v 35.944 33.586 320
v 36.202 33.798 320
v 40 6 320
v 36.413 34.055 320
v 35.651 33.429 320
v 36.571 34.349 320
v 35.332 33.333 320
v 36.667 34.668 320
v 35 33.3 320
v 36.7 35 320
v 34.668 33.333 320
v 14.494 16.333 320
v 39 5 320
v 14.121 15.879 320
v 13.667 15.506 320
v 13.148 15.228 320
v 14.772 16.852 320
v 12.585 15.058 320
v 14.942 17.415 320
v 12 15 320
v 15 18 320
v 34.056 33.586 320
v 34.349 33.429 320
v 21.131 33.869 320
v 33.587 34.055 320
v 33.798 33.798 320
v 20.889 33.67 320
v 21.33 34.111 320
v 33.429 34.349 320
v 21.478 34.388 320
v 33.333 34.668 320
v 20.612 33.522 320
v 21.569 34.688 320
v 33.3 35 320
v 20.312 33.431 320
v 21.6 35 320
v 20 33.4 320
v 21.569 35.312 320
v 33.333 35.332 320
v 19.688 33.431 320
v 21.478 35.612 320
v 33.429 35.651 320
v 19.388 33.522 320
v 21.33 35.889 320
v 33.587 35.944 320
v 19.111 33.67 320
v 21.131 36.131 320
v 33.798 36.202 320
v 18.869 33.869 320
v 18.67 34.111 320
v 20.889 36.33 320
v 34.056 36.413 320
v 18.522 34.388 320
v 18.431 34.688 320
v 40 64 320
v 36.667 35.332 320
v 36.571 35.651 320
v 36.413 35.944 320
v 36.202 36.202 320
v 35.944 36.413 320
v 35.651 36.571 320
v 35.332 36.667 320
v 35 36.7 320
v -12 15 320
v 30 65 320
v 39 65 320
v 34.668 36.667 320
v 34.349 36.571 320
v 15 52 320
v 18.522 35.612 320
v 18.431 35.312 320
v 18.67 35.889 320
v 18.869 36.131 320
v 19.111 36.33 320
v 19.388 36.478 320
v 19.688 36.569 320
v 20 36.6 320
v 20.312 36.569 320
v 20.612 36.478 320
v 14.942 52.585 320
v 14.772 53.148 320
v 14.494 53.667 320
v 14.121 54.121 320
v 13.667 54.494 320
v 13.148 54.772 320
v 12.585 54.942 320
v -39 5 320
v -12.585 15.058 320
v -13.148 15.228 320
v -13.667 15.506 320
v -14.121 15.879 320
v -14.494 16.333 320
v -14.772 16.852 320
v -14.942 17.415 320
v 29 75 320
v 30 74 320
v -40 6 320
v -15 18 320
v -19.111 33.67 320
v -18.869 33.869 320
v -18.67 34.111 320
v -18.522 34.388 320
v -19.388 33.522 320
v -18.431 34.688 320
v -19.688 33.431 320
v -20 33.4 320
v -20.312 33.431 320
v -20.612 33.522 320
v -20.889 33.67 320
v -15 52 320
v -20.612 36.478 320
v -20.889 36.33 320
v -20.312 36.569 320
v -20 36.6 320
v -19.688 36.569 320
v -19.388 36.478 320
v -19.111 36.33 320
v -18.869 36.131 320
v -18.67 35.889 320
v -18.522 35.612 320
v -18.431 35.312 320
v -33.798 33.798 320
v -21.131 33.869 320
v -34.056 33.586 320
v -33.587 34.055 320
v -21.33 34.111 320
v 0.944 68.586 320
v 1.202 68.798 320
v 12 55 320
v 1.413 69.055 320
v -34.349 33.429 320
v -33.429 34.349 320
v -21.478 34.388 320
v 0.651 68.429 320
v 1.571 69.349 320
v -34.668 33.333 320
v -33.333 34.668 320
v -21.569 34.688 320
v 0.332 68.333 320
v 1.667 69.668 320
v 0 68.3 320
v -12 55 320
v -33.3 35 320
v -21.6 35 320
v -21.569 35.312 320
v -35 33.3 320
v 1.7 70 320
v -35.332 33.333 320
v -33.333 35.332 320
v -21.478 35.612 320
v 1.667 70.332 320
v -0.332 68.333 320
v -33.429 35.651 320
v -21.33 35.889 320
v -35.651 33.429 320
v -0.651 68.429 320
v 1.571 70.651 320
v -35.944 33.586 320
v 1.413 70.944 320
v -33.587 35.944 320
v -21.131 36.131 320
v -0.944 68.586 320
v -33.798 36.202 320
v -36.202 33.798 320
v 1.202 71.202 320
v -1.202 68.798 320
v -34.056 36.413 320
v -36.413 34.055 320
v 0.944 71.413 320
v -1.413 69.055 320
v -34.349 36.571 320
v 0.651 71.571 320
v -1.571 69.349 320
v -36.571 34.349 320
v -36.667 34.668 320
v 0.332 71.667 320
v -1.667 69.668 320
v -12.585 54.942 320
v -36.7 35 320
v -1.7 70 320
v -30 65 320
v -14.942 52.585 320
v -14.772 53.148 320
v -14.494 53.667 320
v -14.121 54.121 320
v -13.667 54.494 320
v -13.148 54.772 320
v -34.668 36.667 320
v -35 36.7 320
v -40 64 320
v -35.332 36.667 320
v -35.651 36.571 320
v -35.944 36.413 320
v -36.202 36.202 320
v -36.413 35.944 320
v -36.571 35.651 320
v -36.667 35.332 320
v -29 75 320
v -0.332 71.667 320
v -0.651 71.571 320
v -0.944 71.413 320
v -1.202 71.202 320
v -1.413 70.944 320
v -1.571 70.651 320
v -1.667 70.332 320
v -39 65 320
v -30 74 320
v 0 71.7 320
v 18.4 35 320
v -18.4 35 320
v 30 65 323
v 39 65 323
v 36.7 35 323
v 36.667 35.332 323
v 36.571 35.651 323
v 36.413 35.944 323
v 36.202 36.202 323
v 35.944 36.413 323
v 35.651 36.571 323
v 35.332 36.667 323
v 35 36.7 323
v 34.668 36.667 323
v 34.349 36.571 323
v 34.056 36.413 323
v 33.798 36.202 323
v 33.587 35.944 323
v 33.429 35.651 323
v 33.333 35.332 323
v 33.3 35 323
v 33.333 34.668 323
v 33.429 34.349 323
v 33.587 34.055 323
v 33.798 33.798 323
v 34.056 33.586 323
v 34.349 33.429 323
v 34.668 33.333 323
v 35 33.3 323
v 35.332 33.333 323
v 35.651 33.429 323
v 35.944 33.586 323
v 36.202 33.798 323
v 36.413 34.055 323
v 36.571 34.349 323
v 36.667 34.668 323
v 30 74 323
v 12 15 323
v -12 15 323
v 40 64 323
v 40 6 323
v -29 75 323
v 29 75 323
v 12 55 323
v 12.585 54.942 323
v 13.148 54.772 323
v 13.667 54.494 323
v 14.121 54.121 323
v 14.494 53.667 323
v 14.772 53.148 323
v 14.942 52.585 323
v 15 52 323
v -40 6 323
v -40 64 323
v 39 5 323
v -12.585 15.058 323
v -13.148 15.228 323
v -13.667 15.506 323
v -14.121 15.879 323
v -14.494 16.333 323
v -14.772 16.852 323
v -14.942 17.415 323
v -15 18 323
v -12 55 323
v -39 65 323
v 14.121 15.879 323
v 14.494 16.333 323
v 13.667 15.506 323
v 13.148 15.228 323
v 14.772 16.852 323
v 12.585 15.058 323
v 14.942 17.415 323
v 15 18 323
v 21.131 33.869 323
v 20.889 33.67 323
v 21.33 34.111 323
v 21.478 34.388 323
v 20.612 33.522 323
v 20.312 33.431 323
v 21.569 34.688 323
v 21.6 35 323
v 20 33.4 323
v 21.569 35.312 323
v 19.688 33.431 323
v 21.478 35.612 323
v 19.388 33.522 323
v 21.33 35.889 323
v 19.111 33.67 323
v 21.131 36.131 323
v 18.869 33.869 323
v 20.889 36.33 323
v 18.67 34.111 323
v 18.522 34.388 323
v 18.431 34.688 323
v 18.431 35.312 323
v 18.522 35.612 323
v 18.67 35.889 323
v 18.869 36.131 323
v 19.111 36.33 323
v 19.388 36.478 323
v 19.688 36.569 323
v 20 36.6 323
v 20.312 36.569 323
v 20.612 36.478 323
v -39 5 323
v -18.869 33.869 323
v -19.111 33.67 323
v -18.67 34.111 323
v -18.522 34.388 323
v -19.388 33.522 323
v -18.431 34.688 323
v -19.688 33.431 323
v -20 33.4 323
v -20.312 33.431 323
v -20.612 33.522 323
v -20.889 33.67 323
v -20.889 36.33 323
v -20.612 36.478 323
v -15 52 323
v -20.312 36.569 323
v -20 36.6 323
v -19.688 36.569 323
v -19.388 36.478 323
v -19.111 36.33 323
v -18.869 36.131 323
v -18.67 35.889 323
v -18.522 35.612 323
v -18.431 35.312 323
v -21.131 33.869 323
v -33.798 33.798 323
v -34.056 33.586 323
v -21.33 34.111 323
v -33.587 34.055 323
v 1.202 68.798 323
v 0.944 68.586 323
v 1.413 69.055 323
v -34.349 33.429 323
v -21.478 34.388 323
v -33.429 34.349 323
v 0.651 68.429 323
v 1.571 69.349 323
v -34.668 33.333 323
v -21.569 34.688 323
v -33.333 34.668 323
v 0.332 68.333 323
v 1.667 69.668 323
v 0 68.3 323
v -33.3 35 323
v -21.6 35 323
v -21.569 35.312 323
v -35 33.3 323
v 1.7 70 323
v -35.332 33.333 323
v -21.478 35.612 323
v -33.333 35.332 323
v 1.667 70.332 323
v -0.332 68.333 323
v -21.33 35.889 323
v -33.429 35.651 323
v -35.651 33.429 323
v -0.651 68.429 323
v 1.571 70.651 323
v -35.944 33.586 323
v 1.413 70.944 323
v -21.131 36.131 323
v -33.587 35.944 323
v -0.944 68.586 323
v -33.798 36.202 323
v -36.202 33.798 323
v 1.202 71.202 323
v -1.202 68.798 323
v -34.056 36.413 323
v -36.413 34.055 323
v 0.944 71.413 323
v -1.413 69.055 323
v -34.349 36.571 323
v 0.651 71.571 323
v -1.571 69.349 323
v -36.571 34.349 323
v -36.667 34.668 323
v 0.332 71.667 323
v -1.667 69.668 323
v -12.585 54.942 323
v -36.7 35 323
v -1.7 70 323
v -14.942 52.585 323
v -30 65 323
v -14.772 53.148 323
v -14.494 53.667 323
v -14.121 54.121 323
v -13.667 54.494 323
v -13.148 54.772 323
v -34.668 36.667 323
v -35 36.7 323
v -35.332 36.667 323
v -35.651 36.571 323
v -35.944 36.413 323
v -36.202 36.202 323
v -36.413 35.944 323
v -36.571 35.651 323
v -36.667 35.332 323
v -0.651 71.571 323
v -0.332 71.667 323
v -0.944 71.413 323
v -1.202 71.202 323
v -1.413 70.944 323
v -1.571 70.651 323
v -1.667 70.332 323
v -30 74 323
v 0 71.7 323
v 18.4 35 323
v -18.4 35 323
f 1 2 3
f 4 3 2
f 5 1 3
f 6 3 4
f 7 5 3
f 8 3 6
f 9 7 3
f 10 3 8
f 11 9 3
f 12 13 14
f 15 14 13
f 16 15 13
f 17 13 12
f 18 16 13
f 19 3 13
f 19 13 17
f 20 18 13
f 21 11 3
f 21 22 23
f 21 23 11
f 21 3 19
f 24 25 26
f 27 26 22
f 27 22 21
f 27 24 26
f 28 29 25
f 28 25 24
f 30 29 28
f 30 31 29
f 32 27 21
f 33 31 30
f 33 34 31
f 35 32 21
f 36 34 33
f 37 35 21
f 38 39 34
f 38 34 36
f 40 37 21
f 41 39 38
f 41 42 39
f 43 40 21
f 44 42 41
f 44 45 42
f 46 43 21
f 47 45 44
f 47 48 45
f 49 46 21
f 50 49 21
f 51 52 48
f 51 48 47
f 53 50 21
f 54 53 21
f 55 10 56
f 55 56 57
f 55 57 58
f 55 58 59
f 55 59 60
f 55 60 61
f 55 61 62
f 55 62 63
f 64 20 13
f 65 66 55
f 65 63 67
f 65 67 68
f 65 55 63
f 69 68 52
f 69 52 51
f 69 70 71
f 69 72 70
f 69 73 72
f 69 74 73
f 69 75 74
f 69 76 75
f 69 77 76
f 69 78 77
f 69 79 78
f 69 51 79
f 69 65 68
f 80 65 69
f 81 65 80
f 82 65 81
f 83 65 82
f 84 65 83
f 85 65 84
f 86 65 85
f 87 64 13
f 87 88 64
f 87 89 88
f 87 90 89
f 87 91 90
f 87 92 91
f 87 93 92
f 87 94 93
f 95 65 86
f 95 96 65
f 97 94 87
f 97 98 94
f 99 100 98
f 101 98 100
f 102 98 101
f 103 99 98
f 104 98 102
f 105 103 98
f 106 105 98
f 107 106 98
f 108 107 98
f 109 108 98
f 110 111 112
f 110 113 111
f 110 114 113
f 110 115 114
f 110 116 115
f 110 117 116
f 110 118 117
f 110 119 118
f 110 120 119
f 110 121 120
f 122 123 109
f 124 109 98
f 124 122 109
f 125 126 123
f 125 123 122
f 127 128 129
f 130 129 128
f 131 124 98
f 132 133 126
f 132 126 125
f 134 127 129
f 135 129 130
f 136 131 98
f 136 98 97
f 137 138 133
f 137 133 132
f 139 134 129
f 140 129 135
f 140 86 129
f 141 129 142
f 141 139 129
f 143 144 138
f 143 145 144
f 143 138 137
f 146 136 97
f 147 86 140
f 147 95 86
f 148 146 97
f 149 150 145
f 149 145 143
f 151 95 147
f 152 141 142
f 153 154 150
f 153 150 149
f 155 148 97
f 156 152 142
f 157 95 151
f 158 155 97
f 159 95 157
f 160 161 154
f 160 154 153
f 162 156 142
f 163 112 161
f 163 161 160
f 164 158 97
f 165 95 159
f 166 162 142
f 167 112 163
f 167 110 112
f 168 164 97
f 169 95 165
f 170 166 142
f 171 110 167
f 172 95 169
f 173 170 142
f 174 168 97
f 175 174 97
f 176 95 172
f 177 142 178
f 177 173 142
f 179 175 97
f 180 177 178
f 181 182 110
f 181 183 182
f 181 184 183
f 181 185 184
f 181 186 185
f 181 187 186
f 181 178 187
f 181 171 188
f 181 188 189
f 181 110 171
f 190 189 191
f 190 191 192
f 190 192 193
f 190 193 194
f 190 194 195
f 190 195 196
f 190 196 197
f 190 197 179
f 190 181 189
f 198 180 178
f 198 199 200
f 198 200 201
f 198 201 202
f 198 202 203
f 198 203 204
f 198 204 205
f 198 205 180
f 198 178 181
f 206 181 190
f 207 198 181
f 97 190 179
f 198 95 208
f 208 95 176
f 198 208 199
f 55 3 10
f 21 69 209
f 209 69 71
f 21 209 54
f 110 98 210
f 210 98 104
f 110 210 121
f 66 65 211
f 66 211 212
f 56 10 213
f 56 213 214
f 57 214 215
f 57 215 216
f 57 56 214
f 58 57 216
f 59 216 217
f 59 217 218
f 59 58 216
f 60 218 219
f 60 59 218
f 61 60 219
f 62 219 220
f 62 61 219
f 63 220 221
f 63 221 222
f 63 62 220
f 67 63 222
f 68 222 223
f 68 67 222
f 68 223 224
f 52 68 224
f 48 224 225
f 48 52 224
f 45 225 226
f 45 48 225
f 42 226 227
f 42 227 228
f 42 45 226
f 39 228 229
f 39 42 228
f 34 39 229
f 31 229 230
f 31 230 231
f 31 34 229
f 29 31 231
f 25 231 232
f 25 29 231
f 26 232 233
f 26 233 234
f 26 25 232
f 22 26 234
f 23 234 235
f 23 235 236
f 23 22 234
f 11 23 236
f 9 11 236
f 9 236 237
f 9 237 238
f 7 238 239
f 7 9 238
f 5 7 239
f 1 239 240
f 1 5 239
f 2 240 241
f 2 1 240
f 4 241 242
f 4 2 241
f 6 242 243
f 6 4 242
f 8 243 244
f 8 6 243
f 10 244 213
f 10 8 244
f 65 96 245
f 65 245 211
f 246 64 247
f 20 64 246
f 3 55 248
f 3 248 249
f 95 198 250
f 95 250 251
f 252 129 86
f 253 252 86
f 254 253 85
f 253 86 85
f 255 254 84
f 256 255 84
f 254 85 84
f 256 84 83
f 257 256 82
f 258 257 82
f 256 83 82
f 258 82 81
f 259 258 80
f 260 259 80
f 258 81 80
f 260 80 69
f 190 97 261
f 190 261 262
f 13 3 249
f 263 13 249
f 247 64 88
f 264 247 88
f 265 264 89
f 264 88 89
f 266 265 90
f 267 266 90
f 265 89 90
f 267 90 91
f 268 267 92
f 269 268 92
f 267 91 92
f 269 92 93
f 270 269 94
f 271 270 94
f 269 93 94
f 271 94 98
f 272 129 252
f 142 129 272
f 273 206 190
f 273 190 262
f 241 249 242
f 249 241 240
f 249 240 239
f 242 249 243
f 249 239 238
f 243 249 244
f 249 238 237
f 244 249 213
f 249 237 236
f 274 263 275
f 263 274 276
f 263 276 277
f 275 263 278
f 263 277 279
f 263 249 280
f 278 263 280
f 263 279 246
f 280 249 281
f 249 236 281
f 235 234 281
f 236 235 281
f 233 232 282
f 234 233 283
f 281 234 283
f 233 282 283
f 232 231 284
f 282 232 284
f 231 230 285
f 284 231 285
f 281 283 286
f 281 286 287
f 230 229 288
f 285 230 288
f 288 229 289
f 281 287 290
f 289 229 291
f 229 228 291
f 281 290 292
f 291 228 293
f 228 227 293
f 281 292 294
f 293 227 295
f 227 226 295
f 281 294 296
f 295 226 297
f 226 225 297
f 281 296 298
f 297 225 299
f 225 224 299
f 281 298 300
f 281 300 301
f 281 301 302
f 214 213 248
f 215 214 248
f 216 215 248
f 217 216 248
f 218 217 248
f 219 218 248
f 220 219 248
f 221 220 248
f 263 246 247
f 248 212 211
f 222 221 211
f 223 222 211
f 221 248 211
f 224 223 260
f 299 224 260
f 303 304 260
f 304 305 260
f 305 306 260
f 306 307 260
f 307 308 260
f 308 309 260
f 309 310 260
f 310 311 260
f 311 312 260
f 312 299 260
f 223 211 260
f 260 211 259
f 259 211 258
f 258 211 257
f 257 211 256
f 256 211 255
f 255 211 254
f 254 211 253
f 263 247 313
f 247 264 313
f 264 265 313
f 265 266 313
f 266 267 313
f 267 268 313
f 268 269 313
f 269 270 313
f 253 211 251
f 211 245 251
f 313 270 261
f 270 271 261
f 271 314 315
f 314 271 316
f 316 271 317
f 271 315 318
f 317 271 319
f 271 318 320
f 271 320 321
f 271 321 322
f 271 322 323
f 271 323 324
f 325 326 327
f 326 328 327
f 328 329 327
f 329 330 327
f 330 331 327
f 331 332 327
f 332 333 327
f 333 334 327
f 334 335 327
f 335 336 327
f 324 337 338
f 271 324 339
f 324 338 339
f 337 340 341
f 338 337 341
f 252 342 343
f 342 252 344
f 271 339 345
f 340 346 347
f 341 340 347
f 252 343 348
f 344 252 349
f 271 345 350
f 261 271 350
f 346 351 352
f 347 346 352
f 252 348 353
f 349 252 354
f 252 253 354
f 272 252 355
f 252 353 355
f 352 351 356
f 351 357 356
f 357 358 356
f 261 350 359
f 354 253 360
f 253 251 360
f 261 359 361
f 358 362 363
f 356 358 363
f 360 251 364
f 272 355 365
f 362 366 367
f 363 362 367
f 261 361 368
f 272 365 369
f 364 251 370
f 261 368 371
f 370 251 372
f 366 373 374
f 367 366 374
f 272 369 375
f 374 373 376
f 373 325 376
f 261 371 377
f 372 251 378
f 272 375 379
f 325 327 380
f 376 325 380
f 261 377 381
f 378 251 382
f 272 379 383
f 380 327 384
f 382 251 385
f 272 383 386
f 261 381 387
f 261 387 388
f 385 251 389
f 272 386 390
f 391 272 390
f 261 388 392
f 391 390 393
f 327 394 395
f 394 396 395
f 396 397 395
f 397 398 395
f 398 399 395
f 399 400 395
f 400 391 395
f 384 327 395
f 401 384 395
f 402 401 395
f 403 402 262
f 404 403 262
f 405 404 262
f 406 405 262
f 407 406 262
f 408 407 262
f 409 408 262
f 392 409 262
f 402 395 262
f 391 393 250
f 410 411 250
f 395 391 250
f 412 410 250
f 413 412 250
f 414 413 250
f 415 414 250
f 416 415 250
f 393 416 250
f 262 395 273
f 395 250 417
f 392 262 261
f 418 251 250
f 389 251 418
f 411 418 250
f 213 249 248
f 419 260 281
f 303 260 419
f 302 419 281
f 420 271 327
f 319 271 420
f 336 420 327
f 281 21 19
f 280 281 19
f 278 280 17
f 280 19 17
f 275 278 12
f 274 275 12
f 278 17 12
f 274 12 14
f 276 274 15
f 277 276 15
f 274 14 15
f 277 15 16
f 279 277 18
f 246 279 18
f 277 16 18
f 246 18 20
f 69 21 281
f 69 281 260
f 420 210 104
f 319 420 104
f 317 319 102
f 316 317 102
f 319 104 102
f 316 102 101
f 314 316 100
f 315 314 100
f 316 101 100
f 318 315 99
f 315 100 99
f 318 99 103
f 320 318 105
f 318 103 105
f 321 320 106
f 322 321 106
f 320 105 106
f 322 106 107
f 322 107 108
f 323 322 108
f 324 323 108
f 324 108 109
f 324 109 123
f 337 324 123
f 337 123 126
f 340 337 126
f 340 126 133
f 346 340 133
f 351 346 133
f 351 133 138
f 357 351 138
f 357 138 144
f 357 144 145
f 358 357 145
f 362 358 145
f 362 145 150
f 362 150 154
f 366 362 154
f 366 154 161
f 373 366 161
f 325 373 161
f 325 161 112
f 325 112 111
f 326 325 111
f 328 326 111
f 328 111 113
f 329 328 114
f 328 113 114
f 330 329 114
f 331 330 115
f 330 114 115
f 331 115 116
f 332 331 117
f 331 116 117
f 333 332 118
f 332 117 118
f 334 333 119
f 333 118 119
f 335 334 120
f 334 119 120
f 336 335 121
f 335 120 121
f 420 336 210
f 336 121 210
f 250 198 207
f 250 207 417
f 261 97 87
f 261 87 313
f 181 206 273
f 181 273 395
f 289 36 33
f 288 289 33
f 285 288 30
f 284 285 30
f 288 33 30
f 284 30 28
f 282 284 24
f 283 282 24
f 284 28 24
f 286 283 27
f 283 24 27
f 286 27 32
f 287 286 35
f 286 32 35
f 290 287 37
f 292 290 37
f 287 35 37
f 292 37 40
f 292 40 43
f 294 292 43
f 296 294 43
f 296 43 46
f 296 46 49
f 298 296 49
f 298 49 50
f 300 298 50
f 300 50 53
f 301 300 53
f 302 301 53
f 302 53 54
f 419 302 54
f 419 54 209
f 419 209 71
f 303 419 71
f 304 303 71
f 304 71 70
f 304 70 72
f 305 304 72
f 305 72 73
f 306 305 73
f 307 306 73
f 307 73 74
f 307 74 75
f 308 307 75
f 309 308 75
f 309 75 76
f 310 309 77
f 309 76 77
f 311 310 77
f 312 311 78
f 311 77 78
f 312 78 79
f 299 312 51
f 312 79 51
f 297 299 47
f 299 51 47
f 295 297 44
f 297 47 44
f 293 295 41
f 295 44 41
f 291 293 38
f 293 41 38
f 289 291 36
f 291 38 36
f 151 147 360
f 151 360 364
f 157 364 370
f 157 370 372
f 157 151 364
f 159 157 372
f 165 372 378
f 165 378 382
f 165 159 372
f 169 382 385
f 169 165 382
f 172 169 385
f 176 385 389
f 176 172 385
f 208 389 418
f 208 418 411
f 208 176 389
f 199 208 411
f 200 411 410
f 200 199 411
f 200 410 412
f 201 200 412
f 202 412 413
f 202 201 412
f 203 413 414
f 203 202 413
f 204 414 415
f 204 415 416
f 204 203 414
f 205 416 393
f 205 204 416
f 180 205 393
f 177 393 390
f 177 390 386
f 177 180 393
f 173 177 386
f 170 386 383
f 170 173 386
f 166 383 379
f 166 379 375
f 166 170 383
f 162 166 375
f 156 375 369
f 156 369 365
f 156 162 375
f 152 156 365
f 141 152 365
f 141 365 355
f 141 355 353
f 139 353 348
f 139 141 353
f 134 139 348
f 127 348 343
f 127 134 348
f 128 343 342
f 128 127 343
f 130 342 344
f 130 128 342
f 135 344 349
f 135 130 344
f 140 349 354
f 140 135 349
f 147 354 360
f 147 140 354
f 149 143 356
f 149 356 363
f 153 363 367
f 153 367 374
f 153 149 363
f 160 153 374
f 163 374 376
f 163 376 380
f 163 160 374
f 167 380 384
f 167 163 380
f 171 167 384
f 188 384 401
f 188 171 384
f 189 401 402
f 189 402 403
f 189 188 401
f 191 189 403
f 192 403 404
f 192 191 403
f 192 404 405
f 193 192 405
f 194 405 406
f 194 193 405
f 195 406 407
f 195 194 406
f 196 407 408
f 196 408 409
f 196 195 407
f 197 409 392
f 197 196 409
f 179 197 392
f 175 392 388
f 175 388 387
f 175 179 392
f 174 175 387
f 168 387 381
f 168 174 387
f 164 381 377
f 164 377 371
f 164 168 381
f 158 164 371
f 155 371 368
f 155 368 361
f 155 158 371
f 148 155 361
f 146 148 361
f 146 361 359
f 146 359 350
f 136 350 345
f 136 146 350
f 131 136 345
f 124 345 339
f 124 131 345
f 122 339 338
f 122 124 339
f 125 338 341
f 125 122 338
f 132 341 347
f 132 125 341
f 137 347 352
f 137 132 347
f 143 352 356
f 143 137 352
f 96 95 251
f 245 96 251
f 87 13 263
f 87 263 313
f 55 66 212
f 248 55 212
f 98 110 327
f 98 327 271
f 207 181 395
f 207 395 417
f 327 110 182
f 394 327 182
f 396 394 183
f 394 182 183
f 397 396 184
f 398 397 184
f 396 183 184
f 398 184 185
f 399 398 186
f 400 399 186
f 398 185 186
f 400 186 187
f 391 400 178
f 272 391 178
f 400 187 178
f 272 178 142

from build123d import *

# Parameters (mm, degrees)
SKETCH152_R     = 1.7
PAD084_DEPTH    = 3
CHAMFER055_SIZE = 1
SKETCH225_R     = 1.6
POCKET053_DEPTH = 3.001


with BuildPart() as part:
    # Sketch152 → Pad084 (new body)
    with BuildSketch(Plane.XY):
        Polygon((40, -30), (-40, -30), (-40, 30), (-30, 30), (-30, 40), (30, 40), (30, 30), (40, 30), align=None)
        with Locations((0, 35)):
            Circle(SKETCH152_R, mode=Mode.SUBTRACT)
        with Locations((-35, 0)):
            Circle(SKETCH152_R, mode=Mode.SUBTRACT)
        with Locations((35, 0)):
            Circle(SKETCH152_R, mode=Mode.SUBTRACT)
    extrude(amount=PAD084_DEPTH)

    # Chamfer055
    chamfer055_edges = [part.edges().sort_by_distance(p)[0] for p in [
        (40, 30, 1.5),
        (30, 40, 1.5),
        (-30, 40, 1.5),
        (-40, 30, 1.5),
        (-40, -30, 1.5),
        (40, -30, 1.5),
    ]]
    chamfer(chamfer055_edges, length=CHAMFER055_SIZE)


with BuildPart() as part_1:
    # Body072 placement: moved
    add(part.part.moved(Location((0, 34.999969, 320.000031))))

    # Sketch225 (on Face2 of Clone003) → Pocket053 (cut, through all)
    with BuildSketch(Plane(origin=(0, 34.999969, 320.000031), x_dir=(1, 0, 0), z_dir=(0, 0, -1))):
        with Locations((-20, 0)):
            Circle(SKETCH225_R)
        with Locations((20, 0)):
            Circle(SKETCH225_R)
        with BuildLine():
            ThreePointArc((-12, 20), (-14.12132, 19.12132), (-15, 17))
            Line((-15, -17), (-15, 17))
            ThreePointArc((-15, -17), (-14.12132, -19.12132), (-12, -20))
            Line((12, -20), (-12, -20))
            ThreePointArc((12, -20), (14.12132, -19.12132), (15, -17))
            Line((15, 17), (15, -17))
            ThreePointArc((15, 17), (14.12132, 19.12132), (12, 20))
            Line((-12, 20), (12, 20))
        make_face()
    extrude(amount=-POCKET053_DEPTH, mode=Mode.SUBTRACT)


solid = part_1.part
